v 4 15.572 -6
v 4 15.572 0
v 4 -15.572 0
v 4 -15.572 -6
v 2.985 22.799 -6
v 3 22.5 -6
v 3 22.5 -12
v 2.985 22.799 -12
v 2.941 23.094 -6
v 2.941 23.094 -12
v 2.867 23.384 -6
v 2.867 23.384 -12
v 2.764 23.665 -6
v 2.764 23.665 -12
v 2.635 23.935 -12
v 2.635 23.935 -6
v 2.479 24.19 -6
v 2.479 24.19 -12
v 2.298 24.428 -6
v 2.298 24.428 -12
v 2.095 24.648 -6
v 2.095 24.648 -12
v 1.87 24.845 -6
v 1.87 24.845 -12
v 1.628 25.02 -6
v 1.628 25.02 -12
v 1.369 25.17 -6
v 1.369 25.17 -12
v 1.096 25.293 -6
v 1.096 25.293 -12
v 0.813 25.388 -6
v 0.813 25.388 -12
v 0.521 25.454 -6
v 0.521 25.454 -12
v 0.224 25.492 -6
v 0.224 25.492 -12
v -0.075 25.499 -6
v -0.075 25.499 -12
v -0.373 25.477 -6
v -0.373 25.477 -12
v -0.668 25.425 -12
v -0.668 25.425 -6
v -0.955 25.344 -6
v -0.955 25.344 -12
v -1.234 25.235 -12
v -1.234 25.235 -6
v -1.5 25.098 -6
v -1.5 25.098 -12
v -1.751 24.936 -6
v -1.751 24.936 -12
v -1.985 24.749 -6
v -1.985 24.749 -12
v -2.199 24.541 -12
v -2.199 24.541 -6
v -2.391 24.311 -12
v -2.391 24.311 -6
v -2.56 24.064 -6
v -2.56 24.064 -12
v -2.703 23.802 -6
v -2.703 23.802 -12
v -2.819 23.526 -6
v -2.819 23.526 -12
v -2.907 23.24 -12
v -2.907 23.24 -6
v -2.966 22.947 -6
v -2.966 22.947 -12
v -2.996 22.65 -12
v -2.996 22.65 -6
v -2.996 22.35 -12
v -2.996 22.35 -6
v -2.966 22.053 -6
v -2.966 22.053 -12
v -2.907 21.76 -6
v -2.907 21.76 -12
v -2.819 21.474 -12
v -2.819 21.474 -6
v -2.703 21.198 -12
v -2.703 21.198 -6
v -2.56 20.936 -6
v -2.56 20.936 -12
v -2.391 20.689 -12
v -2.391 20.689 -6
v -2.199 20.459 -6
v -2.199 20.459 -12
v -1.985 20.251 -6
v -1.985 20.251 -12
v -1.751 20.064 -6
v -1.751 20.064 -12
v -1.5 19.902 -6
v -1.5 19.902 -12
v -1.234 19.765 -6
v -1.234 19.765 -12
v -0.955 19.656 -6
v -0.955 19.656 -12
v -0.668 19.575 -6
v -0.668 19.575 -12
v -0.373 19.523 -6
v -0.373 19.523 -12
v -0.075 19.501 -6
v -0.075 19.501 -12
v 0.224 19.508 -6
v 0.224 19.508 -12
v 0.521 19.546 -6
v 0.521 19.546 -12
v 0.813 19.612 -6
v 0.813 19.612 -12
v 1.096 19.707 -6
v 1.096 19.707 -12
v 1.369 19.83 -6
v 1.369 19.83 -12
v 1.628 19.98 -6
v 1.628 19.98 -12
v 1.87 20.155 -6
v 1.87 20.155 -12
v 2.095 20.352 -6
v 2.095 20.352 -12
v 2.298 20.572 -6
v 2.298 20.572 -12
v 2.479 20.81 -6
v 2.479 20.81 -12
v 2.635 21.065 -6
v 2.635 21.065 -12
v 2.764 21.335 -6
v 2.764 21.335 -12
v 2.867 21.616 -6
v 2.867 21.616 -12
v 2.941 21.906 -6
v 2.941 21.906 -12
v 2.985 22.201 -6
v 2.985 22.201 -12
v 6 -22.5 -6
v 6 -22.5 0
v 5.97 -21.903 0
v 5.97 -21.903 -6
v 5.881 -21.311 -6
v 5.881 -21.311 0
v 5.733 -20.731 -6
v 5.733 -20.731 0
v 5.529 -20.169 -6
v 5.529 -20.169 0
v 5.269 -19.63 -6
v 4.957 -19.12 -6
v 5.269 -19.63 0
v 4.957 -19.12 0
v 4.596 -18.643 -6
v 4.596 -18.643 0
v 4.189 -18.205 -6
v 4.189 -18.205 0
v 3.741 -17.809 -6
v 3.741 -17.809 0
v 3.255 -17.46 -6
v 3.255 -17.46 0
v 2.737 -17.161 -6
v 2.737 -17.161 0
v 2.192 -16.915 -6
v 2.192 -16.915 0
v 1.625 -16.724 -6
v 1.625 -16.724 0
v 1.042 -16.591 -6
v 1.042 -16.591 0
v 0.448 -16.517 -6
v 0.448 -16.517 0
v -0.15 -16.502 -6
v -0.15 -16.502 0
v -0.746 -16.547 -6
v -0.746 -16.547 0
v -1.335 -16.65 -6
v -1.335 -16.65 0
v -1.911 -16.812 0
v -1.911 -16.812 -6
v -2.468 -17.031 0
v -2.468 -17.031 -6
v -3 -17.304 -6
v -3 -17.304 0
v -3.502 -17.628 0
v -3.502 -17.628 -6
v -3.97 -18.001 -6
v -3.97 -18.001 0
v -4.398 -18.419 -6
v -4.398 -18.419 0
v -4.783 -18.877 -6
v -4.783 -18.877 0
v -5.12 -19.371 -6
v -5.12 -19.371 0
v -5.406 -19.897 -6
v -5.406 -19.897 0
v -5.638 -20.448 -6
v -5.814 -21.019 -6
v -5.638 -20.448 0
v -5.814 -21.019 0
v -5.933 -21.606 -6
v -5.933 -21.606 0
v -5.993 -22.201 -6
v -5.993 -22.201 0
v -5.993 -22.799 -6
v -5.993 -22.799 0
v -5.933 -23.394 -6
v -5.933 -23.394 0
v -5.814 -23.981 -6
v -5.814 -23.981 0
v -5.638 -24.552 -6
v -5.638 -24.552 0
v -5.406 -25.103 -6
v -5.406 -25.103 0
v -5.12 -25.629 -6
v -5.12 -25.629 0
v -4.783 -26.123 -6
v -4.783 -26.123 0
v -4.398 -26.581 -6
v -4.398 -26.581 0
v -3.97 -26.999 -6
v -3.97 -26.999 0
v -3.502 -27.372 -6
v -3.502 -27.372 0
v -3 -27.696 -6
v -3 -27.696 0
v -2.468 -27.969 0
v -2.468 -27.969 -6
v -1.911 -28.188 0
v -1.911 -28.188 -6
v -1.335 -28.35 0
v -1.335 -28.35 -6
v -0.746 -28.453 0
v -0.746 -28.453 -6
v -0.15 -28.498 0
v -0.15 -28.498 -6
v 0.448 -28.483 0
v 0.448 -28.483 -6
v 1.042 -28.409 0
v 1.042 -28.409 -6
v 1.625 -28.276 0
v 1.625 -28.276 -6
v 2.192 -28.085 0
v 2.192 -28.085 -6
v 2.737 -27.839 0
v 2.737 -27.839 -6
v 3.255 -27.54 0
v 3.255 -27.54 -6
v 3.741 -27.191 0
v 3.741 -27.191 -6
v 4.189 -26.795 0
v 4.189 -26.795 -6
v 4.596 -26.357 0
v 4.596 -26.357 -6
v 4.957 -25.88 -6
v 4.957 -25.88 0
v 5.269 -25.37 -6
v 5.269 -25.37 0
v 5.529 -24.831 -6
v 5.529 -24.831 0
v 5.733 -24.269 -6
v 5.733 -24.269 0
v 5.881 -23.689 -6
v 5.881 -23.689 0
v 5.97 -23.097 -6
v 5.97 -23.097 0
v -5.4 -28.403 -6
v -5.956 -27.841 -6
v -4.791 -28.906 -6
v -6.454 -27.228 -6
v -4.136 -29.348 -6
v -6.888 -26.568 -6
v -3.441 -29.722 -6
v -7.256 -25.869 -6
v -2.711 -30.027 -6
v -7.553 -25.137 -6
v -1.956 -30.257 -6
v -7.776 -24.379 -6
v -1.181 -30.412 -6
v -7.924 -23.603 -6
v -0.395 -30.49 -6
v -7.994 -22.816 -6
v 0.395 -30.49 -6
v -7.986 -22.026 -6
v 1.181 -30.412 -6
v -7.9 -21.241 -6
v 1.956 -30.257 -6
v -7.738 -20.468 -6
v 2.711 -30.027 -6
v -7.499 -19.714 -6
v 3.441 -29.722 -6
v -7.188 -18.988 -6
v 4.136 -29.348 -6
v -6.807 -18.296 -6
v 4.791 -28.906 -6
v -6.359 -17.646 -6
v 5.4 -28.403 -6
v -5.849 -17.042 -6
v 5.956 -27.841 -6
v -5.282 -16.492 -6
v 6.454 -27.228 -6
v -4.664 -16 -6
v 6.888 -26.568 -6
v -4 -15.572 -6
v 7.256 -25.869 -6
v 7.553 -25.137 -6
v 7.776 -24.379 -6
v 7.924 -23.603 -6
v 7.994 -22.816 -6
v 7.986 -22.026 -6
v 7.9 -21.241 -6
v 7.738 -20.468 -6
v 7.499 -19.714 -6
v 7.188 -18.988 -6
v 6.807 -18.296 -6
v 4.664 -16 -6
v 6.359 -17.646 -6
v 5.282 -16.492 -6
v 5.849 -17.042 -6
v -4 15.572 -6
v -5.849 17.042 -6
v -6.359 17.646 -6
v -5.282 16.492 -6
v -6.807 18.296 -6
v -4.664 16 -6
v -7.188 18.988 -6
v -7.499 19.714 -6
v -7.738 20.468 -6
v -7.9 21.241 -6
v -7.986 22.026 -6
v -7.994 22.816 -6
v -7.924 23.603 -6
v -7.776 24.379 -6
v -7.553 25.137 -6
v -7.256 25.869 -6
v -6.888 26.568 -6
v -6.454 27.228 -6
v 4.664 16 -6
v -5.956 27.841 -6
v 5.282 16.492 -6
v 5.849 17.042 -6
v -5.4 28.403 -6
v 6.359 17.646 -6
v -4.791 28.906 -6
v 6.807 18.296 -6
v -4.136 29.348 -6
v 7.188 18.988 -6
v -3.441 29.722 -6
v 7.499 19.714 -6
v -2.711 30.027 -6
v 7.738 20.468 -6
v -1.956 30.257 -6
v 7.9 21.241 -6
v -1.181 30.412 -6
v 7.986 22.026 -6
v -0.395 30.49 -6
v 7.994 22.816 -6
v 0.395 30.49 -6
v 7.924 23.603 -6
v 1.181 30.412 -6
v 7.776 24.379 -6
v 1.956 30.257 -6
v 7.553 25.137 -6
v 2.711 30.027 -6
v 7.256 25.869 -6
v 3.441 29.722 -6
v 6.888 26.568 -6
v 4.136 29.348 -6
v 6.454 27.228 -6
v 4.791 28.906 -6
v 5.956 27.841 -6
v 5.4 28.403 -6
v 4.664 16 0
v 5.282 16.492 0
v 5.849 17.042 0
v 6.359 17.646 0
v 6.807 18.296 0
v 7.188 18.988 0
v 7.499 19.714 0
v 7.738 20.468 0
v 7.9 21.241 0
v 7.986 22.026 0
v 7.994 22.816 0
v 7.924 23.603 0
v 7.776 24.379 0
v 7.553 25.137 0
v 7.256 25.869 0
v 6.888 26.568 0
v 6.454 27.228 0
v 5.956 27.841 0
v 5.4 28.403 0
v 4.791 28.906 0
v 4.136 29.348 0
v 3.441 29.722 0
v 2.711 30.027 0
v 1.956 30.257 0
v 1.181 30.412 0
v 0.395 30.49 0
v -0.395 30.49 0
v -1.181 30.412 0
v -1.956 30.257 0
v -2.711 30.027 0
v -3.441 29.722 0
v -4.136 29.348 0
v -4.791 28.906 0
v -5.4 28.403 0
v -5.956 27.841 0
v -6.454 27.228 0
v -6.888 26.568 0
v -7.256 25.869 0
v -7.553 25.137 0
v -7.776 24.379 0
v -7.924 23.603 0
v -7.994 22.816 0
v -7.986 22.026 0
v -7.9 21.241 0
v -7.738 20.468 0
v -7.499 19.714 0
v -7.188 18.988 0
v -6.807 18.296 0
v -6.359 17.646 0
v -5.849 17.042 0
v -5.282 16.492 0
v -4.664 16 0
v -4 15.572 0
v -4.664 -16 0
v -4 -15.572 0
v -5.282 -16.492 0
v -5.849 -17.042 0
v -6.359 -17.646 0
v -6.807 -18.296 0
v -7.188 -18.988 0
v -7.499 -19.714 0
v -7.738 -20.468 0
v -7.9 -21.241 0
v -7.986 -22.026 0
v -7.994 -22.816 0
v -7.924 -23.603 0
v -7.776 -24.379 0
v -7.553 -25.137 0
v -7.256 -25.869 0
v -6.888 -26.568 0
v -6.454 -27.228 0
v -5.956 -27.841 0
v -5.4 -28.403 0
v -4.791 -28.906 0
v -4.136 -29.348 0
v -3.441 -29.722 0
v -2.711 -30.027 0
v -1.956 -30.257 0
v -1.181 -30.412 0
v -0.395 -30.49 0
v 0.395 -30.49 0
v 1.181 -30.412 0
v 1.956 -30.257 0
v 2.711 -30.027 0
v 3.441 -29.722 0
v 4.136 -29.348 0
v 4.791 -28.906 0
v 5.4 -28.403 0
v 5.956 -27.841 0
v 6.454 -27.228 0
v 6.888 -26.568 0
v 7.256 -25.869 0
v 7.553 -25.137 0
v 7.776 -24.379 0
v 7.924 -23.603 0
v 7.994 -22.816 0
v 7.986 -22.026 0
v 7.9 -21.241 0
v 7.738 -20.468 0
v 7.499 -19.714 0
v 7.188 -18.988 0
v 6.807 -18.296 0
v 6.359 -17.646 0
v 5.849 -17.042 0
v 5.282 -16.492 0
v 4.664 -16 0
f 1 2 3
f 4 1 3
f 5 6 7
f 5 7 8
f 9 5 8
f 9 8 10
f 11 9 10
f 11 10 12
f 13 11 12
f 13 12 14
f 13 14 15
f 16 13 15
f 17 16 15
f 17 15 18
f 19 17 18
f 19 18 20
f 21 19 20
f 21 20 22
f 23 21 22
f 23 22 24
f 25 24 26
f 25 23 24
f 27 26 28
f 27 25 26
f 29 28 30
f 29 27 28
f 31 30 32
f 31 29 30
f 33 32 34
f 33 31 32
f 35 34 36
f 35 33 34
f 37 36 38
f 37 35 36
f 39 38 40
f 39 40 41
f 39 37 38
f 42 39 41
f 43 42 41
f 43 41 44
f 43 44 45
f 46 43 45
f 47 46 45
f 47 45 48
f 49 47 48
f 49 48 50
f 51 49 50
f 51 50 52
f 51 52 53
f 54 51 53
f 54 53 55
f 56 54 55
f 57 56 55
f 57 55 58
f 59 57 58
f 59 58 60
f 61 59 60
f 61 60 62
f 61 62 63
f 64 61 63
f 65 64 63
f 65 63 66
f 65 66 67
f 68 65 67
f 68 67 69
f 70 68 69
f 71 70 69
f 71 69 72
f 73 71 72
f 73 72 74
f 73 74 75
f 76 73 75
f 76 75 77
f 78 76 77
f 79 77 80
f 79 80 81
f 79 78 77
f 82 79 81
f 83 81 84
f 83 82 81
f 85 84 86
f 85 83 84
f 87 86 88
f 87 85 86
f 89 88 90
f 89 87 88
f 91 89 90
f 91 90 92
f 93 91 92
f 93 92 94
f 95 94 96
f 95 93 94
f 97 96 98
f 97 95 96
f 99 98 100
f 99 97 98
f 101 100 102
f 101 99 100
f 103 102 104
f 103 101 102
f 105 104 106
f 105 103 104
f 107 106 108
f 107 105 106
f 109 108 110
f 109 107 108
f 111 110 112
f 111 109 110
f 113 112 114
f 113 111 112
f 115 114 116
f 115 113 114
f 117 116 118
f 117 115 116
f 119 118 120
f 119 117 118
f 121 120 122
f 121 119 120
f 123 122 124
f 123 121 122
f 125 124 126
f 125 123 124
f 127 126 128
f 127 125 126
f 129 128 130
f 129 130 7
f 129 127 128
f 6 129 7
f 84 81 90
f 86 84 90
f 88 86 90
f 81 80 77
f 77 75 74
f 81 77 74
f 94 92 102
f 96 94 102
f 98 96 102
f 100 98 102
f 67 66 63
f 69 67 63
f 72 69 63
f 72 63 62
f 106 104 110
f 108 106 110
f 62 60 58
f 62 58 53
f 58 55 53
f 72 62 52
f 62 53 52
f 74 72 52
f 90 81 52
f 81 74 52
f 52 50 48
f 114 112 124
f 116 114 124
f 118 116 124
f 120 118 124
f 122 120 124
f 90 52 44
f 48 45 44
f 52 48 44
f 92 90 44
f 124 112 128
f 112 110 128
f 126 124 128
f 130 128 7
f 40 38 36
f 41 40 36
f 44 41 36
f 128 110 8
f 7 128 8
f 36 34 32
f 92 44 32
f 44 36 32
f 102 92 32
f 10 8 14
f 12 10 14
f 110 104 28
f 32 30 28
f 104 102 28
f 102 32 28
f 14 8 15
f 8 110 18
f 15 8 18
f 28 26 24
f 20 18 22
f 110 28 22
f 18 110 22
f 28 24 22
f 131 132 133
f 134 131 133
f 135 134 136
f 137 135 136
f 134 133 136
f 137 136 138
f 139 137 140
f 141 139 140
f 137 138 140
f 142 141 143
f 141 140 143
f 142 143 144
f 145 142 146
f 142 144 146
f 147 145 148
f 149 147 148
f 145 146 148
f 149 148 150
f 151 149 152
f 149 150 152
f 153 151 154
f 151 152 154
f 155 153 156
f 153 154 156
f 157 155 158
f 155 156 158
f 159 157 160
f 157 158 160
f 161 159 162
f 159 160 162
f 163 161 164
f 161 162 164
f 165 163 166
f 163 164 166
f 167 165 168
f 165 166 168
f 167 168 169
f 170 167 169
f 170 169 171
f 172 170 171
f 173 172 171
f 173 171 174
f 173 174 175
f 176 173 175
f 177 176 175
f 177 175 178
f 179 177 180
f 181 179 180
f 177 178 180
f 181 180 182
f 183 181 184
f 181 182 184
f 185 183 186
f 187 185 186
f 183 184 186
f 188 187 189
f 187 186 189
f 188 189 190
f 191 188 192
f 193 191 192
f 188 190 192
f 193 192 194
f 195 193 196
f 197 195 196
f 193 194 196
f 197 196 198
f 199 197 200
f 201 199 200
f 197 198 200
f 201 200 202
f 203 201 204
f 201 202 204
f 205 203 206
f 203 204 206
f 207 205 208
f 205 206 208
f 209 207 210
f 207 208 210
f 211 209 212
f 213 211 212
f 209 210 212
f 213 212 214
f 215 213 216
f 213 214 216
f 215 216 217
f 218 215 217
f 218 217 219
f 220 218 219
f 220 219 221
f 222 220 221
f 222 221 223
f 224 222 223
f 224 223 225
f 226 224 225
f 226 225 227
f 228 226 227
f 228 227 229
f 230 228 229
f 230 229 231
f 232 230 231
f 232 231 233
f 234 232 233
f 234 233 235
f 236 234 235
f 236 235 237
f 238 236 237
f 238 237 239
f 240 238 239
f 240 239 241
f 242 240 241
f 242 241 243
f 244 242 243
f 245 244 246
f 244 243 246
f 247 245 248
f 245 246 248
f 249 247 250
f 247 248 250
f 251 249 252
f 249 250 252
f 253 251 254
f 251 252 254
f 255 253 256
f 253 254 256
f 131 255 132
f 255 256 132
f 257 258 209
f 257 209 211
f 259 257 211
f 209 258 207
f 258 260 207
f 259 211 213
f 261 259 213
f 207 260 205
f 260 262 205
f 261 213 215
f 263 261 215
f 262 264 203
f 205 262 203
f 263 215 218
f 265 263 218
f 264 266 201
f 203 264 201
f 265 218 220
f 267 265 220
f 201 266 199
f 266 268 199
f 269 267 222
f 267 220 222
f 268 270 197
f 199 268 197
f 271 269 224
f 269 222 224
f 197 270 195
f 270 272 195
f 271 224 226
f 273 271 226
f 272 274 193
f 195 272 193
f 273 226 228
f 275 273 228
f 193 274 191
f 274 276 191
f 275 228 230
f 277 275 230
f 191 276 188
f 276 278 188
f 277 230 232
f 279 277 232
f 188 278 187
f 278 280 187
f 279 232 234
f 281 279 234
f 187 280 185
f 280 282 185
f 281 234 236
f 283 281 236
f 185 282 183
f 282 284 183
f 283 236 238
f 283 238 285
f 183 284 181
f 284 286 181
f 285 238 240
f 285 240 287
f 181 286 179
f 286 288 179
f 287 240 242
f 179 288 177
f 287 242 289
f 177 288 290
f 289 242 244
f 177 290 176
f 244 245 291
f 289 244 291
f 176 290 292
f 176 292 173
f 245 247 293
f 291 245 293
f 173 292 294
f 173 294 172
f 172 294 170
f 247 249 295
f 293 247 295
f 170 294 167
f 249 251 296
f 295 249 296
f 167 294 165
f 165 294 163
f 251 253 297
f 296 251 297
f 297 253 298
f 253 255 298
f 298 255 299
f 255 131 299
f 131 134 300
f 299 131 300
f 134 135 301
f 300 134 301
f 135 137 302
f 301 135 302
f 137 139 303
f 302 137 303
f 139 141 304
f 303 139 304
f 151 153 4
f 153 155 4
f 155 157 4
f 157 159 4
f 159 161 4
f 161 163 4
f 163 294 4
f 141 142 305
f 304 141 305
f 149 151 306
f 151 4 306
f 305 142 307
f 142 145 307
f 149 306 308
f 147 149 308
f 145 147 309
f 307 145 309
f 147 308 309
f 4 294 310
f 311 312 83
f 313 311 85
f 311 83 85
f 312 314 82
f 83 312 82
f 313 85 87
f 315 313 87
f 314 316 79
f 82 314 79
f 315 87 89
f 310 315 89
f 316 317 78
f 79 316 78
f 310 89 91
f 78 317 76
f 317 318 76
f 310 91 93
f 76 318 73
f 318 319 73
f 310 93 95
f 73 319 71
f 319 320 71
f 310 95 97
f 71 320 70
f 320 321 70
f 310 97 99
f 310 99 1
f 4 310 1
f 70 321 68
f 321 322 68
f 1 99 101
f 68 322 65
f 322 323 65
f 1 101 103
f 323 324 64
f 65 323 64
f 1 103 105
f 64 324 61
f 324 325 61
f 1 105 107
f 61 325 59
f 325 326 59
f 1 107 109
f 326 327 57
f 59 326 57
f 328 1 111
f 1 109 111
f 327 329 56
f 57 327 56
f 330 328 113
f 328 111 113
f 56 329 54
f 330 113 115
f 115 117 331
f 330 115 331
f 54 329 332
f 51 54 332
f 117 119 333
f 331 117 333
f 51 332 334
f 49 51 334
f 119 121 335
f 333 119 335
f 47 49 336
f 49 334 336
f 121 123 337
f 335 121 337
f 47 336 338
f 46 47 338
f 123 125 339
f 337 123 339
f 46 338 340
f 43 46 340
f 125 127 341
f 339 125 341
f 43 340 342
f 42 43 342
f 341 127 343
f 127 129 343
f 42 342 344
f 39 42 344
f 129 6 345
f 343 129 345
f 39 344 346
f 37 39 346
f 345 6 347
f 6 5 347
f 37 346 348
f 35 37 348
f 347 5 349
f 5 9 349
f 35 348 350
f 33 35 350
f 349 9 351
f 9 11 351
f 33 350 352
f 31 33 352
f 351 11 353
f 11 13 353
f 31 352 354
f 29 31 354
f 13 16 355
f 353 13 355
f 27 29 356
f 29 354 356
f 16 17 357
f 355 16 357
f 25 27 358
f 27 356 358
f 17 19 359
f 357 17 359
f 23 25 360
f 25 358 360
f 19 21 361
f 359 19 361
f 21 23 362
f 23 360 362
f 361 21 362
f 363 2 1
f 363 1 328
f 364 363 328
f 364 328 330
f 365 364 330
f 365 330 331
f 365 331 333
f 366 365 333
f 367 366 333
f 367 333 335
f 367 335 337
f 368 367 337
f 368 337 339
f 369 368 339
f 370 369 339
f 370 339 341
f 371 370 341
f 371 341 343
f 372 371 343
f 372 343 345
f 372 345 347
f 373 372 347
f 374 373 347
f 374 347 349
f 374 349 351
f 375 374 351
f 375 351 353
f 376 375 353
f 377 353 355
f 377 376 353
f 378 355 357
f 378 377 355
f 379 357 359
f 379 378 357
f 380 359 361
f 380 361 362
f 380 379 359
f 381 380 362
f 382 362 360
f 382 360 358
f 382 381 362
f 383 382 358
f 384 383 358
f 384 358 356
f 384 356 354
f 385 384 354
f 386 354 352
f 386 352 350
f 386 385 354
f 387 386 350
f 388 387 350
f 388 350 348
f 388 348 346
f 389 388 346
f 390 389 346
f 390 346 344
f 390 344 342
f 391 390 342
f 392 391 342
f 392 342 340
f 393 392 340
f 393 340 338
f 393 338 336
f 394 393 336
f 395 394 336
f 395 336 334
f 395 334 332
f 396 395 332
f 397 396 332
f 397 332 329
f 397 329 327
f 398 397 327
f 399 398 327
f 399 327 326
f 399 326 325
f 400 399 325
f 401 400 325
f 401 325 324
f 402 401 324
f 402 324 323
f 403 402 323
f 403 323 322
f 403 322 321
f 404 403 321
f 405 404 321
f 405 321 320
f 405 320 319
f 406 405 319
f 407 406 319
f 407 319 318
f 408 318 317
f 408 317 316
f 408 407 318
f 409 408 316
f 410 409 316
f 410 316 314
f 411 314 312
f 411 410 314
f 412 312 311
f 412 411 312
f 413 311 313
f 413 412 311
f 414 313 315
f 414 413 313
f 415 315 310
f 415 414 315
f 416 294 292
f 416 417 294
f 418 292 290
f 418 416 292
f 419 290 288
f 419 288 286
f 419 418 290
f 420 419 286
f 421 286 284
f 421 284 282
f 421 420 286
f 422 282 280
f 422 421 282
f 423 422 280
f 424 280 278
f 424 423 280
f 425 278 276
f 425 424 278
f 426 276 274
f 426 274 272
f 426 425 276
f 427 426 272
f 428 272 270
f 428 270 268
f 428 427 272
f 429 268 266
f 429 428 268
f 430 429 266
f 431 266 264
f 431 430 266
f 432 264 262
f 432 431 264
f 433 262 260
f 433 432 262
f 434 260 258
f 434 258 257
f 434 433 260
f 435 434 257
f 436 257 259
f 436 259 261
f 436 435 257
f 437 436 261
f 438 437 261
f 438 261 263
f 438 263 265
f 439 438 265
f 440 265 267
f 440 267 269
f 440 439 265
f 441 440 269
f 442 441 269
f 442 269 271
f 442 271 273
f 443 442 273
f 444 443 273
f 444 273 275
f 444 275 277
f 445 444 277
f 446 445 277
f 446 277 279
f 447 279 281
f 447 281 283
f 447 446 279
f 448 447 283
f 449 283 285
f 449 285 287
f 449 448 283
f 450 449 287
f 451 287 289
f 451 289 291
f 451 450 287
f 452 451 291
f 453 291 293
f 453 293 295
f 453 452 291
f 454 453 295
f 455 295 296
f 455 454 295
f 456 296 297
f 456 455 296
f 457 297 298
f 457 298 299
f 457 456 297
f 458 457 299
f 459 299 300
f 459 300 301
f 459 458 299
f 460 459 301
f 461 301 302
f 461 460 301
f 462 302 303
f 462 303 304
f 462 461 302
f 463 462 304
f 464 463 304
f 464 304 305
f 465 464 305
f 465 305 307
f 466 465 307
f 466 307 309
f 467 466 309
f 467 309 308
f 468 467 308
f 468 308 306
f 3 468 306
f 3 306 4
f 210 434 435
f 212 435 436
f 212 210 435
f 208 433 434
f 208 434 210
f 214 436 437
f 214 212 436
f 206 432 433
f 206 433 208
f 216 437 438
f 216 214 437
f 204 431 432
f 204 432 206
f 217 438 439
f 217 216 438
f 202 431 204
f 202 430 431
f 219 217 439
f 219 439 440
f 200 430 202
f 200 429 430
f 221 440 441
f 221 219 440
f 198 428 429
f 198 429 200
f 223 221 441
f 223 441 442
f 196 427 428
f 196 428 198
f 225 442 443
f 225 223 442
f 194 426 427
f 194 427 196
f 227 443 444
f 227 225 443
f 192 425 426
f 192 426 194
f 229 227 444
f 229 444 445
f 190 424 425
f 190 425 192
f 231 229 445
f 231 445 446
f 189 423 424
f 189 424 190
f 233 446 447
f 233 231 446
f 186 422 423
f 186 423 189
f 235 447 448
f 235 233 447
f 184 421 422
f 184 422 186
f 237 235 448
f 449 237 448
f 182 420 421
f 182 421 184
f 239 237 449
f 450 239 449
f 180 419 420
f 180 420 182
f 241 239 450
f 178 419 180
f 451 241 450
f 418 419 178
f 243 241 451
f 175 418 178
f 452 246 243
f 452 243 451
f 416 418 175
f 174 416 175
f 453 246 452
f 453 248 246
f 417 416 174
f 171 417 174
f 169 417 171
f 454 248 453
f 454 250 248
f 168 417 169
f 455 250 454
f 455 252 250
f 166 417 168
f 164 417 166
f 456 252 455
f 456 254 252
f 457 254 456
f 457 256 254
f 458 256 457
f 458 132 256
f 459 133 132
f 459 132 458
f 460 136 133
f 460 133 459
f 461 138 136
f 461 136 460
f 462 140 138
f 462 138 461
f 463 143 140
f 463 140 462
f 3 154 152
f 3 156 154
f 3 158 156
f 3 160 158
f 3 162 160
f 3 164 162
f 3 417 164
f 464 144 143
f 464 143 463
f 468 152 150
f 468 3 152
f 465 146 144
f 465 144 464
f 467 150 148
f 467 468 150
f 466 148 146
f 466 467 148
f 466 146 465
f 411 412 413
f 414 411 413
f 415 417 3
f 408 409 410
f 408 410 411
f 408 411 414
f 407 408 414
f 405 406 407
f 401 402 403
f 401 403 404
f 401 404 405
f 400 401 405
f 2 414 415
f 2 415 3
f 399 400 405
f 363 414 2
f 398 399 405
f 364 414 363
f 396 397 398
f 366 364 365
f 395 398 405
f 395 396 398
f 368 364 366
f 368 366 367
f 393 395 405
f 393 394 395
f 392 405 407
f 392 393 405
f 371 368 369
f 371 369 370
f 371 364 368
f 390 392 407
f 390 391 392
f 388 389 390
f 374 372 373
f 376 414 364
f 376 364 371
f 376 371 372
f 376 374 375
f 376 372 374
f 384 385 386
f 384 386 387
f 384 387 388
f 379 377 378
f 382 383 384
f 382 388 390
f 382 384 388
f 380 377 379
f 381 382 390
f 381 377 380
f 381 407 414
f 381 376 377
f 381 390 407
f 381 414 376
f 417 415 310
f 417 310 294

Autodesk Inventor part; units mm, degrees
ref_plane "YZ Plane" through (0, 0, 0) normal (1, 0, 0) x (0, 1, 0)
ref_plane "XZ Plane" through (0, 0, 0) normal (0, 1, 0) x (-1, 0, 0)
ref_plane "XY Plane" through (0, 0, 0) normal (0, 0, 1) x (1, 0, 0)
sketch "Sketch1" plane through (0, 0, 0) normal (0, 0, 1) x (1, 0, 0)
  arc A0 (-4, -15.5718) -> (4, -15.5718) centre (0, -22.5) ccw
  arc A1 (4, 15.5718) -> (-4, 15.5718) centre (0, 22.5) ccw
  line L0 (-4, 15.5718) -> (-4, -15.5718)
  line L1 (4, 15.5718) -> (4, -15.5718)
  circle A2 centre (0, 22.5) radius 3
  circle A3 centre (0, -22.5) radius 6
  point P0 (0, 0)
  dimension "d0" = 45
  dimension "d1" = 22.5
  dimension "d2" = 8
  dimension "d3" = 4
  dimension "d6" = 8
  dimension "d7" = 8
  dimension "d8" = 12
  dimension "d9" = 6
extrude "Extrusion1" add sketch "Sketch1" against normal blind 6
extrude "Extrusion2" add sketch "Sketch1" against normal blind 12 contours A2
equation "\"d1\" = 0.5 * d0"
properties part number "204"
